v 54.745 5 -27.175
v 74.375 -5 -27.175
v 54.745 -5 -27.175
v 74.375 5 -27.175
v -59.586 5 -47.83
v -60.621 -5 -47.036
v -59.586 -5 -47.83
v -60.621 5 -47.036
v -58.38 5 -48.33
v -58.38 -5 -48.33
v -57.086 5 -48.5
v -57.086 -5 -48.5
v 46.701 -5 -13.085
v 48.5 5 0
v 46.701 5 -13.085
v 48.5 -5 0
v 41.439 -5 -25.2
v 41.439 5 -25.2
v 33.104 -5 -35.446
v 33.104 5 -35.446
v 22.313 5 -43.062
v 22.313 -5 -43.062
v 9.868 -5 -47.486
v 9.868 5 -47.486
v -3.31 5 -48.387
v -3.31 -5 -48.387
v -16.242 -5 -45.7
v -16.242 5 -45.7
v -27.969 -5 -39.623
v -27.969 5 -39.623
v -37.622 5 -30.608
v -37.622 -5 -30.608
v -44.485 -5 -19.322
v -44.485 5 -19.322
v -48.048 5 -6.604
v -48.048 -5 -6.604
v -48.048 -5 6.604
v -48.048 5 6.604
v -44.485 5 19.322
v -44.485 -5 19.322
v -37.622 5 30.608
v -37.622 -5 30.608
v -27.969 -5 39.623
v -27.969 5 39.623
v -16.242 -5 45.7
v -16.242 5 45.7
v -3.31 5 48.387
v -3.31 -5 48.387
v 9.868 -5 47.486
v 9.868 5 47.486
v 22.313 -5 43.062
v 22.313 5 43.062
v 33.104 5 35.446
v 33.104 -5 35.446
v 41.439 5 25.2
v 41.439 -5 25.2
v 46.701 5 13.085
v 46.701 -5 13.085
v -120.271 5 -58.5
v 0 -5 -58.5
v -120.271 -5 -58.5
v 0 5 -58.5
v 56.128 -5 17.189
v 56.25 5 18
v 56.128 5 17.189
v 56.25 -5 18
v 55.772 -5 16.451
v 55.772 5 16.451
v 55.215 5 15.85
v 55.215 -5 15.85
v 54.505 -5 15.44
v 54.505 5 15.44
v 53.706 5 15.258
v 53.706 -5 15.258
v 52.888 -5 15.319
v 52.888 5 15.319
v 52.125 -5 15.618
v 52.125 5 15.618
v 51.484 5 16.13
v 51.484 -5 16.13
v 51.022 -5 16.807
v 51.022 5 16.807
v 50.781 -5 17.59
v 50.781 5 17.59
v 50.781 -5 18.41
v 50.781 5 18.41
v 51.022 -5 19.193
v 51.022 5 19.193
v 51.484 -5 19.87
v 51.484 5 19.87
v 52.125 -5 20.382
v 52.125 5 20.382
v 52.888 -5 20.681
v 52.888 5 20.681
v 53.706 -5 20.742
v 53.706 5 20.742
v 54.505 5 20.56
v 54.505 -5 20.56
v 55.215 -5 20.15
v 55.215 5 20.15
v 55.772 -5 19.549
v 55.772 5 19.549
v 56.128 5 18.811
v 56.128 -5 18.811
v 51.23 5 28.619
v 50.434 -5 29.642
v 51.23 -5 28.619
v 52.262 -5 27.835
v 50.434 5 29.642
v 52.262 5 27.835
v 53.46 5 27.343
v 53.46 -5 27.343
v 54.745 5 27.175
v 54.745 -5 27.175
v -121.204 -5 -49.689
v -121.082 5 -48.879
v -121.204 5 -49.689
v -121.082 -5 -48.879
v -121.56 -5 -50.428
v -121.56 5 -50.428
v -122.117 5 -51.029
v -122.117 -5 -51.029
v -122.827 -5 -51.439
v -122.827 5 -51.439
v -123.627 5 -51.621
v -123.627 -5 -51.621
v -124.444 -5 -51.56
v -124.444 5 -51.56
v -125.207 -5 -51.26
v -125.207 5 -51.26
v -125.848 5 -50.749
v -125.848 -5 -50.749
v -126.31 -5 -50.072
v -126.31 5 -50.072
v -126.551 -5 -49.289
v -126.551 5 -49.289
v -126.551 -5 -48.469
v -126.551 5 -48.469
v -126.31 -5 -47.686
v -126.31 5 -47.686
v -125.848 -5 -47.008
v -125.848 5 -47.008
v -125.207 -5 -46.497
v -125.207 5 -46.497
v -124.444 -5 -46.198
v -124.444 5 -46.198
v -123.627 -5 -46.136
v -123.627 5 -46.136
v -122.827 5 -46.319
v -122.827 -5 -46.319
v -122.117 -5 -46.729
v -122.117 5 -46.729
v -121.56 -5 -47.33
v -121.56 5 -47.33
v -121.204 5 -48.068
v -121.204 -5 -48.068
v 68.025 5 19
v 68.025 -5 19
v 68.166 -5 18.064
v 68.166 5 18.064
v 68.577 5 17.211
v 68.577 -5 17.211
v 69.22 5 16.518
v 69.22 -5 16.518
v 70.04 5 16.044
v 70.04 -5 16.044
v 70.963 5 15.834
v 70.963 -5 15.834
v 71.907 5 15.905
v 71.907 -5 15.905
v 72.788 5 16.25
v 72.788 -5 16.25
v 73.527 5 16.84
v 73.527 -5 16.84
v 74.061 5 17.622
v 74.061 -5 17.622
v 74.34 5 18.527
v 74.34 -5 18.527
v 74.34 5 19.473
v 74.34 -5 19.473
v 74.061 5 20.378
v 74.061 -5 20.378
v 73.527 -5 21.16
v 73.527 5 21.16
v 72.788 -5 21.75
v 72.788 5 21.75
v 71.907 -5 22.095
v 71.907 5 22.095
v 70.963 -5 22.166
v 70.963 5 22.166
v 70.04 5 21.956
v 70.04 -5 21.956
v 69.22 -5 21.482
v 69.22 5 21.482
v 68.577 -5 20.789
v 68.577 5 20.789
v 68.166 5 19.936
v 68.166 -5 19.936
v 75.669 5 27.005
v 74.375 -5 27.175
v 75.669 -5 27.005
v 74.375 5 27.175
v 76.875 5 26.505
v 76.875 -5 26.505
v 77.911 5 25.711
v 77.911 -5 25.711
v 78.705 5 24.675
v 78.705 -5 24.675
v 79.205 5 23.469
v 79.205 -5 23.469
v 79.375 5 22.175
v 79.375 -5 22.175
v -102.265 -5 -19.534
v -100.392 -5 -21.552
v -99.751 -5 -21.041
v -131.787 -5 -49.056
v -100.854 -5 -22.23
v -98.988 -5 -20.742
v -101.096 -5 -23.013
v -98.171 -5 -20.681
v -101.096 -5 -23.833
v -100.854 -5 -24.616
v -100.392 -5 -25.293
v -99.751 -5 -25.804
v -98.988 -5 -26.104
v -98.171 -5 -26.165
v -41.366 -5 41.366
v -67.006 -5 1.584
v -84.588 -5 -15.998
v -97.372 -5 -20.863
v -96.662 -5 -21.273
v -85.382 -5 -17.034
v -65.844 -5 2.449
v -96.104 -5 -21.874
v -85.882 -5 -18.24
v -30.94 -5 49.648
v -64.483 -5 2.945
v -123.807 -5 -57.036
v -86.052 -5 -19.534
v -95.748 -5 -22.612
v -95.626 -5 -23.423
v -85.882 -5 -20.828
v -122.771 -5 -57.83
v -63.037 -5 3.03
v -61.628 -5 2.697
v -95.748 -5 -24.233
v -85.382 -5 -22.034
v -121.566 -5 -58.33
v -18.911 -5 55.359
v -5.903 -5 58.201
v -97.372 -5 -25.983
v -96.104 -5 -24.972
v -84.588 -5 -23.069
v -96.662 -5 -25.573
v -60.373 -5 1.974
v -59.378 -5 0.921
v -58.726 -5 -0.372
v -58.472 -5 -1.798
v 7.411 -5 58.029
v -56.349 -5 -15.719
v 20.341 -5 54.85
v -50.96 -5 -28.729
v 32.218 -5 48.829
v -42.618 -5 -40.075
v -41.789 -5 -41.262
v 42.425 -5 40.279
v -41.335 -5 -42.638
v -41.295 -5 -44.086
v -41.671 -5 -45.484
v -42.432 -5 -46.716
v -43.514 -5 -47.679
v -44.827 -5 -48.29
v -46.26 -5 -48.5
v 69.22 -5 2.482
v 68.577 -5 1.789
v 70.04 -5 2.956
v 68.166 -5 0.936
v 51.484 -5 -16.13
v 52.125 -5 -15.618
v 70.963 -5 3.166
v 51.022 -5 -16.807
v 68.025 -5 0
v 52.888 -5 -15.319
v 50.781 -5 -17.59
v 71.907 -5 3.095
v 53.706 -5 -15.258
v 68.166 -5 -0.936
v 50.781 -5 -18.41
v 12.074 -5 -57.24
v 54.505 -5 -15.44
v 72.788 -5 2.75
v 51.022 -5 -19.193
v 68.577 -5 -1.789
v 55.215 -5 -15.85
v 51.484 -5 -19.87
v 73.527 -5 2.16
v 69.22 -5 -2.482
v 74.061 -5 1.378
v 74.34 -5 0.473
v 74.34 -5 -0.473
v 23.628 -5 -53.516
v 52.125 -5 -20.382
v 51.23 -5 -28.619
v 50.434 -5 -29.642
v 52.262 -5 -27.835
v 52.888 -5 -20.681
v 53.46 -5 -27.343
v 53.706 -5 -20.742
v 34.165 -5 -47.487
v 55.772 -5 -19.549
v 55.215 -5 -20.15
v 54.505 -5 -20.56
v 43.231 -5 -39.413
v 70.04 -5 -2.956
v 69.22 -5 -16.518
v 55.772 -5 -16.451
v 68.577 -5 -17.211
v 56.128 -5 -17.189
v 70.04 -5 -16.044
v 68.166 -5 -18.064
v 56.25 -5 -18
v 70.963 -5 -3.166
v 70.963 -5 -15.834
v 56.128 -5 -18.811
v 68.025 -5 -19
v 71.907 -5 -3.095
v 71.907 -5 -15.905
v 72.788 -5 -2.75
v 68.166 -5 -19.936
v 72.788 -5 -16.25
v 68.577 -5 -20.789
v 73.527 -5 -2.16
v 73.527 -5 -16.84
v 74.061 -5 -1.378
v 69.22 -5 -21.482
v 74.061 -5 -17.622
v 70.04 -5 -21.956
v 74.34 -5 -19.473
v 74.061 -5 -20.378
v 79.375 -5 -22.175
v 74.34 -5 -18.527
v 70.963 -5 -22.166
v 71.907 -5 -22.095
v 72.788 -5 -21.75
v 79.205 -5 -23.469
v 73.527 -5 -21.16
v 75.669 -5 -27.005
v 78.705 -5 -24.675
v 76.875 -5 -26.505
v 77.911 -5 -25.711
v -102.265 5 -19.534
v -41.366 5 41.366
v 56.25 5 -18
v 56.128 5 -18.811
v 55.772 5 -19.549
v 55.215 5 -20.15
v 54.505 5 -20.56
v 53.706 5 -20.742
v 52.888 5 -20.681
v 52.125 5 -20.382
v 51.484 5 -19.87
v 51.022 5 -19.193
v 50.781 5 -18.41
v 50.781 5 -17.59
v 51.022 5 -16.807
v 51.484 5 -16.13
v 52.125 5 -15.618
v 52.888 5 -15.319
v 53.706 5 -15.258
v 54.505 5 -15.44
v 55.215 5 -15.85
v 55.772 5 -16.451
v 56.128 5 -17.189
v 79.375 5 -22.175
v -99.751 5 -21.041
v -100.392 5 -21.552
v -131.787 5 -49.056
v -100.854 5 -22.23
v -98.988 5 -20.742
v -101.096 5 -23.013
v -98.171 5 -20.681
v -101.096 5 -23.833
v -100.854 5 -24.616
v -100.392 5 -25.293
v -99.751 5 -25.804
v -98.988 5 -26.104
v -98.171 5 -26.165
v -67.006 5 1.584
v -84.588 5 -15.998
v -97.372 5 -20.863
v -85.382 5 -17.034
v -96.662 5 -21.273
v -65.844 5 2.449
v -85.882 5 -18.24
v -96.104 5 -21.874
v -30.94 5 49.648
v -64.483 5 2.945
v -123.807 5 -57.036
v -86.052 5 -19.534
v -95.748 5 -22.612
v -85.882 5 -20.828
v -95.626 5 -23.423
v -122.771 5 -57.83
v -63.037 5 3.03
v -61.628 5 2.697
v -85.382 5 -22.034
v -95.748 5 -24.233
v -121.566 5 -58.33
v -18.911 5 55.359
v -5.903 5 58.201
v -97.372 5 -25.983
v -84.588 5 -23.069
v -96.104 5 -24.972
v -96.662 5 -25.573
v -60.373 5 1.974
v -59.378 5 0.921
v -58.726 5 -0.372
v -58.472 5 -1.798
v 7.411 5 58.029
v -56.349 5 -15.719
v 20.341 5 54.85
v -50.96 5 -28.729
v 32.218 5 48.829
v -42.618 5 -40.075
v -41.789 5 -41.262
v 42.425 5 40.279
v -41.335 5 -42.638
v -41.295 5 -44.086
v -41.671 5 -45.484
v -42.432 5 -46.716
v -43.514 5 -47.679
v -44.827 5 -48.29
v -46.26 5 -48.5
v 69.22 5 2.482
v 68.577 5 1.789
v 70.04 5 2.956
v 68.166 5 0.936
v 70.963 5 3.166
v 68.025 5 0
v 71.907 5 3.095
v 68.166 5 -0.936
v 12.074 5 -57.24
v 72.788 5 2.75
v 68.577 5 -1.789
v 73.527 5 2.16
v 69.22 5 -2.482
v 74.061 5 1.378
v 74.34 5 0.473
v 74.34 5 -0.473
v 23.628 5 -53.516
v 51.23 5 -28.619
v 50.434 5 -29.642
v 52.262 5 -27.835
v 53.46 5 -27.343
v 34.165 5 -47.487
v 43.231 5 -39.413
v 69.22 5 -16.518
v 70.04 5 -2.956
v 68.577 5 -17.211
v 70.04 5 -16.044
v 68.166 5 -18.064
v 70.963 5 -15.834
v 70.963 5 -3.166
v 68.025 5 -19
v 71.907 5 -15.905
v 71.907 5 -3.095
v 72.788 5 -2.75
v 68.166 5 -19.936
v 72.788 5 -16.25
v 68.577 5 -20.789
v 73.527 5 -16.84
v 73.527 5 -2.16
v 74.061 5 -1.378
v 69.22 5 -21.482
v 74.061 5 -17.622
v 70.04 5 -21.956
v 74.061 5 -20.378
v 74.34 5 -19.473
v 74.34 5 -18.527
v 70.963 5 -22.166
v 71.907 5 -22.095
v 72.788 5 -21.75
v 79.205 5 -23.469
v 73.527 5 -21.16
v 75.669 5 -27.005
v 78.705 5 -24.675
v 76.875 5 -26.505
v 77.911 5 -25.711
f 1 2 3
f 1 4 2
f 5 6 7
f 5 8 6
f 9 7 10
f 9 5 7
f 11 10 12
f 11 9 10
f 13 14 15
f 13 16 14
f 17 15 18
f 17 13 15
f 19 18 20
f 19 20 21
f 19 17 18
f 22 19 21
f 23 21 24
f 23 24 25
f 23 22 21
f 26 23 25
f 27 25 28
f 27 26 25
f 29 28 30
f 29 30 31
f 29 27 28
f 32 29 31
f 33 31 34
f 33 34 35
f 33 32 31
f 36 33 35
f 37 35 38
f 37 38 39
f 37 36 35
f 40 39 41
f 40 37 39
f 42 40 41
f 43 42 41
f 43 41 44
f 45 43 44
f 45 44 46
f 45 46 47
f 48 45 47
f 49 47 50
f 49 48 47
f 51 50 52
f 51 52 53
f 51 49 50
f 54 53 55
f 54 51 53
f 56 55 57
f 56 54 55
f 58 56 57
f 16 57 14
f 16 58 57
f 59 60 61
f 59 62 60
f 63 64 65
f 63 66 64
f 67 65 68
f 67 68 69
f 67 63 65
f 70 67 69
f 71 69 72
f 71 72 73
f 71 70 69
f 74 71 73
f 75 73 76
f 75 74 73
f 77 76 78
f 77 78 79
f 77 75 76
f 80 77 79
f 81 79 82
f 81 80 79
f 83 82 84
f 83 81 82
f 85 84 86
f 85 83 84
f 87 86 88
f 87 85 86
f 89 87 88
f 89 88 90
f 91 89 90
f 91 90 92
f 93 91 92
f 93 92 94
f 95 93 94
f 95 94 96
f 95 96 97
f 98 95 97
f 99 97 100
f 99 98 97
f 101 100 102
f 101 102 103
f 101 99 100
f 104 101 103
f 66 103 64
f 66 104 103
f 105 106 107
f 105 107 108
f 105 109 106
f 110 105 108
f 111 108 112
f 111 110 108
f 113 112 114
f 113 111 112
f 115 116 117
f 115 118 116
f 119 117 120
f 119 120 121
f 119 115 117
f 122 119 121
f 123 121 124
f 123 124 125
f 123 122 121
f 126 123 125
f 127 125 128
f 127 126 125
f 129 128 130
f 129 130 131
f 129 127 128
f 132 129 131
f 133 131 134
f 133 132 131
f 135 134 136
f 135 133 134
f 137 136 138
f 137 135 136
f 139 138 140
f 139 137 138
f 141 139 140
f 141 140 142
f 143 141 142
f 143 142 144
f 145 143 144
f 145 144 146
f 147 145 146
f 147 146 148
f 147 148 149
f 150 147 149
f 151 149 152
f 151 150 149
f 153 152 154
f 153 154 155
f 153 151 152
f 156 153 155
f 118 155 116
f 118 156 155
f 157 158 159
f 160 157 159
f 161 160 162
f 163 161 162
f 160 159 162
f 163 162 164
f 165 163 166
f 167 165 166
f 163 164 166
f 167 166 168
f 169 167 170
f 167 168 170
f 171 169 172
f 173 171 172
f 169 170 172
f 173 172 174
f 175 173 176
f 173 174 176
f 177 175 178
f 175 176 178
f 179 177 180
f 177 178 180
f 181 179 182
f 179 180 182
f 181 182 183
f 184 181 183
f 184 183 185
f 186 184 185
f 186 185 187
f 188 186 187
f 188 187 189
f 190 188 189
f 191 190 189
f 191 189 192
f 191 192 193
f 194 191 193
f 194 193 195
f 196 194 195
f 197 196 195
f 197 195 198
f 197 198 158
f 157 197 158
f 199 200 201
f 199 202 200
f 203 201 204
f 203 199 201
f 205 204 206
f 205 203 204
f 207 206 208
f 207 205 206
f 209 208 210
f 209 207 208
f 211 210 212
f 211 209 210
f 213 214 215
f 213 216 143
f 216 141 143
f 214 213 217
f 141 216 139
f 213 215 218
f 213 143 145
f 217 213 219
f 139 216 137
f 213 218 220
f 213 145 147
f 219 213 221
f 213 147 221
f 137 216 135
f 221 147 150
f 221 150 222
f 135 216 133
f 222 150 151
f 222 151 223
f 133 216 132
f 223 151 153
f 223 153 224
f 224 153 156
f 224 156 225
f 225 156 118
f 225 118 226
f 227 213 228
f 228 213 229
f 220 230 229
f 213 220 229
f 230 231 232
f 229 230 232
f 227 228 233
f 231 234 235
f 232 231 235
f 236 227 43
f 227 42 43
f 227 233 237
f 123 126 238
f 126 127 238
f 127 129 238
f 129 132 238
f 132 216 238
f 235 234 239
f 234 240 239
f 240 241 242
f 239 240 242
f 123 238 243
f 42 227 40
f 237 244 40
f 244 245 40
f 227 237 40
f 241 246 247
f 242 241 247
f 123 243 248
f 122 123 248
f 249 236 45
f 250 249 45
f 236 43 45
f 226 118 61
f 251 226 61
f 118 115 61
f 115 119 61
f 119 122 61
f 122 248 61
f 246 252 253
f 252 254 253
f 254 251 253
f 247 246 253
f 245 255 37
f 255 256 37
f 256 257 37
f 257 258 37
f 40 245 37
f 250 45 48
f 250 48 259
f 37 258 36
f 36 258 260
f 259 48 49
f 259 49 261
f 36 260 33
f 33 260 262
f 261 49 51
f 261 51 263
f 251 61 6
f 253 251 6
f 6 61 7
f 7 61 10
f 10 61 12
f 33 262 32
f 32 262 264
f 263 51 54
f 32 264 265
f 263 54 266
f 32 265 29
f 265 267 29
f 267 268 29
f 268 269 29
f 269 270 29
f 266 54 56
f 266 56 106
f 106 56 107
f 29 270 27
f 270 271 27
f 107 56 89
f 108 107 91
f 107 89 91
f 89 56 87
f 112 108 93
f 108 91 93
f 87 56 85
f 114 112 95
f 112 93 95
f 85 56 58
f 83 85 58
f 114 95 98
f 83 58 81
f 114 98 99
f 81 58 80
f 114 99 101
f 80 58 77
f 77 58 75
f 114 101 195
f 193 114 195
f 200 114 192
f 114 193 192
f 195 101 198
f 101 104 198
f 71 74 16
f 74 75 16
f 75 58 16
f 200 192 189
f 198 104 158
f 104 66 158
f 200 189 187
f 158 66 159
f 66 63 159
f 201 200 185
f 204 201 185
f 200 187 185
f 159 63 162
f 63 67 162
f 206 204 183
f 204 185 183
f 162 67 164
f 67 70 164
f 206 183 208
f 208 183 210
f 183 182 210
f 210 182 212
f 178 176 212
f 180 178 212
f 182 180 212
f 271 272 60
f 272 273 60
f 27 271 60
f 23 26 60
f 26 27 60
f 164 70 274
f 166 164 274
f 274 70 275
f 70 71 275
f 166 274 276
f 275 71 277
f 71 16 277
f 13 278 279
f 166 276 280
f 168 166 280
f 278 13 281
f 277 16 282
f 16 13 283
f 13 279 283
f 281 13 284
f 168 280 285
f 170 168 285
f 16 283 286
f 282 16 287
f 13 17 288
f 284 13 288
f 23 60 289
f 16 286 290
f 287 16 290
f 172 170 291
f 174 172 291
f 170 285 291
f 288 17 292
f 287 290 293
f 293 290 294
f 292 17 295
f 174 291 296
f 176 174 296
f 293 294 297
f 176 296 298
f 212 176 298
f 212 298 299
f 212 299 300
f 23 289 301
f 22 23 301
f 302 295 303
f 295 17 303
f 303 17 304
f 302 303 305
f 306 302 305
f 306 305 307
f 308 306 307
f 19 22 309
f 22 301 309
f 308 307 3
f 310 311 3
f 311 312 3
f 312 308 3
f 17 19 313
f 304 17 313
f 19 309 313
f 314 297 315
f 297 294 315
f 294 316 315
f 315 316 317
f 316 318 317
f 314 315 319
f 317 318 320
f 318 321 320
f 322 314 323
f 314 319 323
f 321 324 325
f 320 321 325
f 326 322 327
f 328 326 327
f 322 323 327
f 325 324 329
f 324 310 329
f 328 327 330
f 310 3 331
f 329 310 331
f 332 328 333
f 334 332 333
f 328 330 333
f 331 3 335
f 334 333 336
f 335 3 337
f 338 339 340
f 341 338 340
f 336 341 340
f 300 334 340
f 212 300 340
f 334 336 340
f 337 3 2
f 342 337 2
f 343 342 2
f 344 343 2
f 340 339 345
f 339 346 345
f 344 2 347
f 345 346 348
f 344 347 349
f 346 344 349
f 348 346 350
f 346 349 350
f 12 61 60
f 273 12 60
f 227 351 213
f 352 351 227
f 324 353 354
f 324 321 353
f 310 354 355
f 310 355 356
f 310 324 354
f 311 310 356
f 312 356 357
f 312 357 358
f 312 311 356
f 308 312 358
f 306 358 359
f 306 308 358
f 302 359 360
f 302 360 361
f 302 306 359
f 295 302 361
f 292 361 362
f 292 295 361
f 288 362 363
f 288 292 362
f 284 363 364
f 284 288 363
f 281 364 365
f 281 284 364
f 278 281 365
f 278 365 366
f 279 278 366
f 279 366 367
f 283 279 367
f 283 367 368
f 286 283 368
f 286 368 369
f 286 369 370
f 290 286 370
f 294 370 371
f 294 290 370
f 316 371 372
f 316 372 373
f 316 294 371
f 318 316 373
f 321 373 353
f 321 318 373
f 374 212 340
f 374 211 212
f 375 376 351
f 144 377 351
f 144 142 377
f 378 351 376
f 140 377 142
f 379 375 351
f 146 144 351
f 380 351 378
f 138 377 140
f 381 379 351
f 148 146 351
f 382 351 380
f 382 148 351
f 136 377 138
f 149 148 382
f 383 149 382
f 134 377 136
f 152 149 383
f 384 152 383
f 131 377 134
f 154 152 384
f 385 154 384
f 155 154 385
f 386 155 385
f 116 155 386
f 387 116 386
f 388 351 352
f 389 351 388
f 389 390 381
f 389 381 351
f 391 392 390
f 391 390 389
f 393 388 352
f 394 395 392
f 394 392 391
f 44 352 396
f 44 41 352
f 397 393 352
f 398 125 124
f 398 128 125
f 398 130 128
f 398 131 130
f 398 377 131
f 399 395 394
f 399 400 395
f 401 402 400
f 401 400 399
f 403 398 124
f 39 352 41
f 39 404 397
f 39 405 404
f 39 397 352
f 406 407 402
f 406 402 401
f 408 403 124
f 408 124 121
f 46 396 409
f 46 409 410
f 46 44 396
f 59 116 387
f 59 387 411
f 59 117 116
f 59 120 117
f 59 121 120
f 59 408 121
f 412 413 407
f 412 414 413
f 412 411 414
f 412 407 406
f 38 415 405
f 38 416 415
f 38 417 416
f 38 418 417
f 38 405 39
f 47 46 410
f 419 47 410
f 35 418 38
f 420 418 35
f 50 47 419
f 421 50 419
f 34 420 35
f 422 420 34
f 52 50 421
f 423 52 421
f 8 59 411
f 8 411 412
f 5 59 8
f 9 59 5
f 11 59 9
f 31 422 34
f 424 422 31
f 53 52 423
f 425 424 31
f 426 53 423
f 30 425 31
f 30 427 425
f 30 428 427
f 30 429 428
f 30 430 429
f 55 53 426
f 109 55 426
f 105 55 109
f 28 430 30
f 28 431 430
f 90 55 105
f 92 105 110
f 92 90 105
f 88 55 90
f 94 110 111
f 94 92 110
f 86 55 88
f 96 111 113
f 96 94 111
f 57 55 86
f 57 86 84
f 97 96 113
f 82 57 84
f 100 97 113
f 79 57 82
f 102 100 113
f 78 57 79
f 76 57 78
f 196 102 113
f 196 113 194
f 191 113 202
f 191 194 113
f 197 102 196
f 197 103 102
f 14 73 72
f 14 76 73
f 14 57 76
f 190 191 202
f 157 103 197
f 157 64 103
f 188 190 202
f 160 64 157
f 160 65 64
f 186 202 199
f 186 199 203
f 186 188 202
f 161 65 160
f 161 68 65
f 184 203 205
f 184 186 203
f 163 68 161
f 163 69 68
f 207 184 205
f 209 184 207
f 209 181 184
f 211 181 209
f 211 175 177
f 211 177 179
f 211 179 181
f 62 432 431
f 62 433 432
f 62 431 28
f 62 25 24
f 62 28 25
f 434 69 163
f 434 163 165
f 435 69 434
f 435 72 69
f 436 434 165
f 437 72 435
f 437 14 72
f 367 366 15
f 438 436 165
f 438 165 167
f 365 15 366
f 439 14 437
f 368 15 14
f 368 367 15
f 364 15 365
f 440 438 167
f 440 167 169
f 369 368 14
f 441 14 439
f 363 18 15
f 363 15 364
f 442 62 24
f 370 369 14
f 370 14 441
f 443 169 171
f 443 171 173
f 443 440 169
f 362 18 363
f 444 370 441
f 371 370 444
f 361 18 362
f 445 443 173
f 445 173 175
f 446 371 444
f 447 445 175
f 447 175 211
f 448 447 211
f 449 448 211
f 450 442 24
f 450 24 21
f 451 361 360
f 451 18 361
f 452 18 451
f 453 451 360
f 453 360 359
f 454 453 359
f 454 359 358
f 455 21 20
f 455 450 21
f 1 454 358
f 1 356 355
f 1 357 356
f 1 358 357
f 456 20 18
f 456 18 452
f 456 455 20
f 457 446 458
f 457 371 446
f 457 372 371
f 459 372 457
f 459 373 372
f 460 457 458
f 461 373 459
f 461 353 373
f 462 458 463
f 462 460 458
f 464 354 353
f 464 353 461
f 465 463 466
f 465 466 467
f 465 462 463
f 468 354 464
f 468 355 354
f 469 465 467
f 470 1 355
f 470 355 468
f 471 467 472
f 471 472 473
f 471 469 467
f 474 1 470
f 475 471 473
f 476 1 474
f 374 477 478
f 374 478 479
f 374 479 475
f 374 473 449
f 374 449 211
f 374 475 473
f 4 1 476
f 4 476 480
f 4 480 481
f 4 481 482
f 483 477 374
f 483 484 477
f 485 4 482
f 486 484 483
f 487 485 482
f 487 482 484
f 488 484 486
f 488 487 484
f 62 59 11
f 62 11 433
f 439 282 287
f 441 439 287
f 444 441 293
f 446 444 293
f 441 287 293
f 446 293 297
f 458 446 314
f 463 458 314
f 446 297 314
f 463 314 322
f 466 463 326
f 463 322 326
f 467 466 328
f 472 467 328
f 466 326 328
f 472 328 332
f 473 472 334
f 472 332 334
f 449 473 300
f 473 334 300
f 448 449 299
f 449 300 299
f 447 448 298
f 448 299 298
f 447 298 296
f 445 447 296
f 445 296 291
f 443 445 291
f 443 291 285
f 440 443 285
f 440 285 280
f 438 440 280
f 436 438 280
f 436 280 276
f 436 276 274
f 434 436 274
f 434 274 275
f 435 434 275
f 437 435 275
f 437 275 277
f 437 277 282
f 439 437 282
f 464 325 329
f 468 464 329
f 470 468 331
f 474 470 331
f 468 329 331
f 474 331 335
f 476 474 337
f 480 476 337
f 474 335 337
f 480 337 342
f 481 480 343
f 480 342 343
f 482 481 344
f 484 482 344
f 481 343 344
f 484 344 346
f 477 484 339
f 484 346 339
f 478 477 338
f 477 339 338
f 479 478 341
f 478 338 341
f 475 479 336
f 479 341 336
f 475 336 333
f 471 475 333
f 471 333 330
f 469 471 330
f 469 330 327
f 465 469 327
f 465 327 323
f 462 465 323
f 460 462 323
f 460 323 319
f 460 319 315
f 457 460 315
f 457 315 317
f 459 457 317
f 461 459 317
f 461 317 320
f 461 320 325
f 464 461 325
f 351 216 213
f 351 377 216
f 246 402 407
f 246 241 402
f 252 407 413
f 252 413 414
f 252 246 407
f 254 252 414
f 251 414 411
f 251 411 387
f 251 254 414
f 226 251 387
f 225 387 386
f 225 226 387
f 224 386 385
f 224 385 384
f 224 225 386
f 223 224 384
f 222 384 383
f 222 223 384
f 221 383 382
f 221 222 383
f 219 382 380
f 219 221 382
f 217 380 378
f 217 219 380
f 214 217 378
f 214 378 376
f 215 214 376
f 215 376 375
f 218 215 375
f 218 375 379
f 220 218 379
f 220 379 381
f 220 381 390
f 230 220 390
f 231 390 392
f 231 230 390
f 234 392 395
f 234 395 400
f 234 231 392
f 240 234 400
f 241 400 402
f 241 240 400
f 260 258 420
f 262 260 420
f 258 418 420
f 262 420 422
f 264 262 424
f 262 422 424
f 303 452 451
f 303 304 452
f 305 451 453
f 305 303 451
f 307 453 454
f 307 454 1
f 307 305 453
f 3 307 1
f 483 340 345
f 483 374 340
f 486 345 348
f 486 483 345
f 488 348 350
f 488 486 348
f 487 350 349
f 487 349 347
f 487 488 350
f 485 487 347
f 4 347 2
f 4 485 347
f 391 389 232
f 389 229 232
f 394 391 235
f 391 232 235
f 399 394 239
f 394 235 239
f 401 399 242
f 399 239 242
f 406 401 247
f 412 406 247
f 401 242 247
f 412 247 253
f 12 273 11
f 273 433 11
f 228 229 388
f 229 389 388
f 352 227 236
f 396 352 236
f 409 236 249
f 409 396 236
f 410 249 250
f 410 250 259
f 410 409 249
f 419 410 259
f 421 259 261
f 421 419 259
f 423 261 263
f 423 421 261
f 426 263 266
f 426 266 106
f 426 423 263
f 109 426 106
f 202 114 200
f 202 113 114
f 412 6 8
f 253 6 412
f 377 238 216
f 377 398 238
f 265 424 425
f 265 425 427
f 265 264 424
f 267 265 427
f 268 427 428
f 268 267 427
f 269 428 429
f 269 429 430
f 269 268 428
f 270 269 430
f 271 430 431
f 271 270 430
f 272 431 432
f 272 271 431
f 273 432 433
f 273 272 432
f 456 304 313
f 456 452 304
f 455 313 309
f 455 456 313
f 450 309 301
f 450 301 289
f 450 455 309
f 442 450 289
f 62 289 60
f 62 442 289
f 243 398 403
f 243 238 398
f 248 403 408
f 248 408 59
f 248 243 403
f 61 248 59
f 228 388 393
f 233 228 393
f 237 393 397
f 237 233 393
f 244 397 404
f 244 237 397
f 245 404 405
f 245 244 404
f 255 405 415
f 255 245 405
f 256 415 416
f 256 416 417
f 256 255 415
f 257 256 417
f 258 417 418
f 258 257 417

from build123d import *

# Parameters (mm, degrees)
SKETCH1_R                   = 48.5
SKETCH1_R_2                 = 2.75
BOSS_EXTRUDE1_DEPTH         = 5
F_1_4_0_25_DIAMETER_HOLE1_D = 6.35
FILLET1_R                   = 5


with BuildPart() as part:
    # Sketch1 → Boss-Extrude1 (new body, symmetric)
    with BuildSketch(Plane(origin=(0, 0, 0), x_dir=(1, 0, 0), z_dir=(0, 1, 0))):
        with BuildLine():
            Line((-102.265318229, 19.53382483), (-41.365746699, -41.365746699))
            ThreePointArc((-41.365746699, -41.365746699), (8.808484383, -57.833040754), (51.805109545, -27.175))
            Line((51.805109545, -27.175), (79.375, -27.175))
            Line((79.375, -27.175), (79.375, 27.175))
            Line((79.375, 27.175), (51.805109545, 27.175))
            ThreePointArc((51.805109545, 27.175), (30.269724974, 50.059901618), (0, 58.5))
            Line((0, 58.5), (-122.342559288, 58.5))
            Line((-122.342559288, 58.5), (-131.787026344, 49.055532945))
            Line((-131.787026344, 49.055532945), (-102.265318229, 19.53382483))
        make_face()
        Circle(SKETCH1_R, mode=Mode.SUBTRACT)
        with Locations((-123.832075055, 48.87875625)):
            Circle(SKETCH1_R_2, mode=Mode.SUBTRACT)
        with Locations((-98.376230933, 23.422912127)):
            Circle(SKETCH1_R_2, mode=Mode.SUBTRACT)
        with Locations((53.5, 18)):
            Circle(SKETCH1_R_2, mode=Mode.SUBTRACT)
        with Locations((53.5, -18)):
            Circle(SKETCH1_R_2, mode=Mode.SUBTRACT)
        with BuildLine():
            Line((-88.123182605, 19.53382483), (-57.4247459, -11.164611875))
            ThreePointArc((-57.4247459, -11.164611875), (-54.046952652, 22.386980793), (-32.710854468, 48.5))
            Line((-32.710854468, 48.5), (-59.157007436, 48.5))
            Line((-59.157007436, 48.5), (-88.123182605, 19.53382483))
        make_face(mode=Mode.SUBTRACT)
    extrude(amount=BOSS_EXTRUDE1_DEPTH, both=True)

    # 1/4 (0.25) Diameter Hole1 (through all)
    with Locations(Plane(origin=(0, 5, 0), x_dir=(1, 0, 0), z_dir=(0, 1, 0))):
        with Locations((71.2, 19), (71.2, 0), (71.2, -19)):
            Hole(F_1_4_0_25_DIAMETER_HOLE1_D / 2)

    # Fillet1
    fillet1_edges = [part.edges().sort_by_distance(p)[0] for p in [
        (-122.342559288, 0, -58.5),
        (51.805109545, 0, -27.175),
        (79.375, 0, -27.175),
        (79.375, 0, 27.175),
        (51.805109545, 0, 27.175),
        (-88.123182605, 0, -19.53382483),
        (-59.157007436, 0, -48.5),
        (-32.710854468, 0, -48.5),
        (-57.4247459, 0, 11.164611875),
    ]]
    fillet(fillet1_edges, radius=FILLET1_R)


solid = part.part
